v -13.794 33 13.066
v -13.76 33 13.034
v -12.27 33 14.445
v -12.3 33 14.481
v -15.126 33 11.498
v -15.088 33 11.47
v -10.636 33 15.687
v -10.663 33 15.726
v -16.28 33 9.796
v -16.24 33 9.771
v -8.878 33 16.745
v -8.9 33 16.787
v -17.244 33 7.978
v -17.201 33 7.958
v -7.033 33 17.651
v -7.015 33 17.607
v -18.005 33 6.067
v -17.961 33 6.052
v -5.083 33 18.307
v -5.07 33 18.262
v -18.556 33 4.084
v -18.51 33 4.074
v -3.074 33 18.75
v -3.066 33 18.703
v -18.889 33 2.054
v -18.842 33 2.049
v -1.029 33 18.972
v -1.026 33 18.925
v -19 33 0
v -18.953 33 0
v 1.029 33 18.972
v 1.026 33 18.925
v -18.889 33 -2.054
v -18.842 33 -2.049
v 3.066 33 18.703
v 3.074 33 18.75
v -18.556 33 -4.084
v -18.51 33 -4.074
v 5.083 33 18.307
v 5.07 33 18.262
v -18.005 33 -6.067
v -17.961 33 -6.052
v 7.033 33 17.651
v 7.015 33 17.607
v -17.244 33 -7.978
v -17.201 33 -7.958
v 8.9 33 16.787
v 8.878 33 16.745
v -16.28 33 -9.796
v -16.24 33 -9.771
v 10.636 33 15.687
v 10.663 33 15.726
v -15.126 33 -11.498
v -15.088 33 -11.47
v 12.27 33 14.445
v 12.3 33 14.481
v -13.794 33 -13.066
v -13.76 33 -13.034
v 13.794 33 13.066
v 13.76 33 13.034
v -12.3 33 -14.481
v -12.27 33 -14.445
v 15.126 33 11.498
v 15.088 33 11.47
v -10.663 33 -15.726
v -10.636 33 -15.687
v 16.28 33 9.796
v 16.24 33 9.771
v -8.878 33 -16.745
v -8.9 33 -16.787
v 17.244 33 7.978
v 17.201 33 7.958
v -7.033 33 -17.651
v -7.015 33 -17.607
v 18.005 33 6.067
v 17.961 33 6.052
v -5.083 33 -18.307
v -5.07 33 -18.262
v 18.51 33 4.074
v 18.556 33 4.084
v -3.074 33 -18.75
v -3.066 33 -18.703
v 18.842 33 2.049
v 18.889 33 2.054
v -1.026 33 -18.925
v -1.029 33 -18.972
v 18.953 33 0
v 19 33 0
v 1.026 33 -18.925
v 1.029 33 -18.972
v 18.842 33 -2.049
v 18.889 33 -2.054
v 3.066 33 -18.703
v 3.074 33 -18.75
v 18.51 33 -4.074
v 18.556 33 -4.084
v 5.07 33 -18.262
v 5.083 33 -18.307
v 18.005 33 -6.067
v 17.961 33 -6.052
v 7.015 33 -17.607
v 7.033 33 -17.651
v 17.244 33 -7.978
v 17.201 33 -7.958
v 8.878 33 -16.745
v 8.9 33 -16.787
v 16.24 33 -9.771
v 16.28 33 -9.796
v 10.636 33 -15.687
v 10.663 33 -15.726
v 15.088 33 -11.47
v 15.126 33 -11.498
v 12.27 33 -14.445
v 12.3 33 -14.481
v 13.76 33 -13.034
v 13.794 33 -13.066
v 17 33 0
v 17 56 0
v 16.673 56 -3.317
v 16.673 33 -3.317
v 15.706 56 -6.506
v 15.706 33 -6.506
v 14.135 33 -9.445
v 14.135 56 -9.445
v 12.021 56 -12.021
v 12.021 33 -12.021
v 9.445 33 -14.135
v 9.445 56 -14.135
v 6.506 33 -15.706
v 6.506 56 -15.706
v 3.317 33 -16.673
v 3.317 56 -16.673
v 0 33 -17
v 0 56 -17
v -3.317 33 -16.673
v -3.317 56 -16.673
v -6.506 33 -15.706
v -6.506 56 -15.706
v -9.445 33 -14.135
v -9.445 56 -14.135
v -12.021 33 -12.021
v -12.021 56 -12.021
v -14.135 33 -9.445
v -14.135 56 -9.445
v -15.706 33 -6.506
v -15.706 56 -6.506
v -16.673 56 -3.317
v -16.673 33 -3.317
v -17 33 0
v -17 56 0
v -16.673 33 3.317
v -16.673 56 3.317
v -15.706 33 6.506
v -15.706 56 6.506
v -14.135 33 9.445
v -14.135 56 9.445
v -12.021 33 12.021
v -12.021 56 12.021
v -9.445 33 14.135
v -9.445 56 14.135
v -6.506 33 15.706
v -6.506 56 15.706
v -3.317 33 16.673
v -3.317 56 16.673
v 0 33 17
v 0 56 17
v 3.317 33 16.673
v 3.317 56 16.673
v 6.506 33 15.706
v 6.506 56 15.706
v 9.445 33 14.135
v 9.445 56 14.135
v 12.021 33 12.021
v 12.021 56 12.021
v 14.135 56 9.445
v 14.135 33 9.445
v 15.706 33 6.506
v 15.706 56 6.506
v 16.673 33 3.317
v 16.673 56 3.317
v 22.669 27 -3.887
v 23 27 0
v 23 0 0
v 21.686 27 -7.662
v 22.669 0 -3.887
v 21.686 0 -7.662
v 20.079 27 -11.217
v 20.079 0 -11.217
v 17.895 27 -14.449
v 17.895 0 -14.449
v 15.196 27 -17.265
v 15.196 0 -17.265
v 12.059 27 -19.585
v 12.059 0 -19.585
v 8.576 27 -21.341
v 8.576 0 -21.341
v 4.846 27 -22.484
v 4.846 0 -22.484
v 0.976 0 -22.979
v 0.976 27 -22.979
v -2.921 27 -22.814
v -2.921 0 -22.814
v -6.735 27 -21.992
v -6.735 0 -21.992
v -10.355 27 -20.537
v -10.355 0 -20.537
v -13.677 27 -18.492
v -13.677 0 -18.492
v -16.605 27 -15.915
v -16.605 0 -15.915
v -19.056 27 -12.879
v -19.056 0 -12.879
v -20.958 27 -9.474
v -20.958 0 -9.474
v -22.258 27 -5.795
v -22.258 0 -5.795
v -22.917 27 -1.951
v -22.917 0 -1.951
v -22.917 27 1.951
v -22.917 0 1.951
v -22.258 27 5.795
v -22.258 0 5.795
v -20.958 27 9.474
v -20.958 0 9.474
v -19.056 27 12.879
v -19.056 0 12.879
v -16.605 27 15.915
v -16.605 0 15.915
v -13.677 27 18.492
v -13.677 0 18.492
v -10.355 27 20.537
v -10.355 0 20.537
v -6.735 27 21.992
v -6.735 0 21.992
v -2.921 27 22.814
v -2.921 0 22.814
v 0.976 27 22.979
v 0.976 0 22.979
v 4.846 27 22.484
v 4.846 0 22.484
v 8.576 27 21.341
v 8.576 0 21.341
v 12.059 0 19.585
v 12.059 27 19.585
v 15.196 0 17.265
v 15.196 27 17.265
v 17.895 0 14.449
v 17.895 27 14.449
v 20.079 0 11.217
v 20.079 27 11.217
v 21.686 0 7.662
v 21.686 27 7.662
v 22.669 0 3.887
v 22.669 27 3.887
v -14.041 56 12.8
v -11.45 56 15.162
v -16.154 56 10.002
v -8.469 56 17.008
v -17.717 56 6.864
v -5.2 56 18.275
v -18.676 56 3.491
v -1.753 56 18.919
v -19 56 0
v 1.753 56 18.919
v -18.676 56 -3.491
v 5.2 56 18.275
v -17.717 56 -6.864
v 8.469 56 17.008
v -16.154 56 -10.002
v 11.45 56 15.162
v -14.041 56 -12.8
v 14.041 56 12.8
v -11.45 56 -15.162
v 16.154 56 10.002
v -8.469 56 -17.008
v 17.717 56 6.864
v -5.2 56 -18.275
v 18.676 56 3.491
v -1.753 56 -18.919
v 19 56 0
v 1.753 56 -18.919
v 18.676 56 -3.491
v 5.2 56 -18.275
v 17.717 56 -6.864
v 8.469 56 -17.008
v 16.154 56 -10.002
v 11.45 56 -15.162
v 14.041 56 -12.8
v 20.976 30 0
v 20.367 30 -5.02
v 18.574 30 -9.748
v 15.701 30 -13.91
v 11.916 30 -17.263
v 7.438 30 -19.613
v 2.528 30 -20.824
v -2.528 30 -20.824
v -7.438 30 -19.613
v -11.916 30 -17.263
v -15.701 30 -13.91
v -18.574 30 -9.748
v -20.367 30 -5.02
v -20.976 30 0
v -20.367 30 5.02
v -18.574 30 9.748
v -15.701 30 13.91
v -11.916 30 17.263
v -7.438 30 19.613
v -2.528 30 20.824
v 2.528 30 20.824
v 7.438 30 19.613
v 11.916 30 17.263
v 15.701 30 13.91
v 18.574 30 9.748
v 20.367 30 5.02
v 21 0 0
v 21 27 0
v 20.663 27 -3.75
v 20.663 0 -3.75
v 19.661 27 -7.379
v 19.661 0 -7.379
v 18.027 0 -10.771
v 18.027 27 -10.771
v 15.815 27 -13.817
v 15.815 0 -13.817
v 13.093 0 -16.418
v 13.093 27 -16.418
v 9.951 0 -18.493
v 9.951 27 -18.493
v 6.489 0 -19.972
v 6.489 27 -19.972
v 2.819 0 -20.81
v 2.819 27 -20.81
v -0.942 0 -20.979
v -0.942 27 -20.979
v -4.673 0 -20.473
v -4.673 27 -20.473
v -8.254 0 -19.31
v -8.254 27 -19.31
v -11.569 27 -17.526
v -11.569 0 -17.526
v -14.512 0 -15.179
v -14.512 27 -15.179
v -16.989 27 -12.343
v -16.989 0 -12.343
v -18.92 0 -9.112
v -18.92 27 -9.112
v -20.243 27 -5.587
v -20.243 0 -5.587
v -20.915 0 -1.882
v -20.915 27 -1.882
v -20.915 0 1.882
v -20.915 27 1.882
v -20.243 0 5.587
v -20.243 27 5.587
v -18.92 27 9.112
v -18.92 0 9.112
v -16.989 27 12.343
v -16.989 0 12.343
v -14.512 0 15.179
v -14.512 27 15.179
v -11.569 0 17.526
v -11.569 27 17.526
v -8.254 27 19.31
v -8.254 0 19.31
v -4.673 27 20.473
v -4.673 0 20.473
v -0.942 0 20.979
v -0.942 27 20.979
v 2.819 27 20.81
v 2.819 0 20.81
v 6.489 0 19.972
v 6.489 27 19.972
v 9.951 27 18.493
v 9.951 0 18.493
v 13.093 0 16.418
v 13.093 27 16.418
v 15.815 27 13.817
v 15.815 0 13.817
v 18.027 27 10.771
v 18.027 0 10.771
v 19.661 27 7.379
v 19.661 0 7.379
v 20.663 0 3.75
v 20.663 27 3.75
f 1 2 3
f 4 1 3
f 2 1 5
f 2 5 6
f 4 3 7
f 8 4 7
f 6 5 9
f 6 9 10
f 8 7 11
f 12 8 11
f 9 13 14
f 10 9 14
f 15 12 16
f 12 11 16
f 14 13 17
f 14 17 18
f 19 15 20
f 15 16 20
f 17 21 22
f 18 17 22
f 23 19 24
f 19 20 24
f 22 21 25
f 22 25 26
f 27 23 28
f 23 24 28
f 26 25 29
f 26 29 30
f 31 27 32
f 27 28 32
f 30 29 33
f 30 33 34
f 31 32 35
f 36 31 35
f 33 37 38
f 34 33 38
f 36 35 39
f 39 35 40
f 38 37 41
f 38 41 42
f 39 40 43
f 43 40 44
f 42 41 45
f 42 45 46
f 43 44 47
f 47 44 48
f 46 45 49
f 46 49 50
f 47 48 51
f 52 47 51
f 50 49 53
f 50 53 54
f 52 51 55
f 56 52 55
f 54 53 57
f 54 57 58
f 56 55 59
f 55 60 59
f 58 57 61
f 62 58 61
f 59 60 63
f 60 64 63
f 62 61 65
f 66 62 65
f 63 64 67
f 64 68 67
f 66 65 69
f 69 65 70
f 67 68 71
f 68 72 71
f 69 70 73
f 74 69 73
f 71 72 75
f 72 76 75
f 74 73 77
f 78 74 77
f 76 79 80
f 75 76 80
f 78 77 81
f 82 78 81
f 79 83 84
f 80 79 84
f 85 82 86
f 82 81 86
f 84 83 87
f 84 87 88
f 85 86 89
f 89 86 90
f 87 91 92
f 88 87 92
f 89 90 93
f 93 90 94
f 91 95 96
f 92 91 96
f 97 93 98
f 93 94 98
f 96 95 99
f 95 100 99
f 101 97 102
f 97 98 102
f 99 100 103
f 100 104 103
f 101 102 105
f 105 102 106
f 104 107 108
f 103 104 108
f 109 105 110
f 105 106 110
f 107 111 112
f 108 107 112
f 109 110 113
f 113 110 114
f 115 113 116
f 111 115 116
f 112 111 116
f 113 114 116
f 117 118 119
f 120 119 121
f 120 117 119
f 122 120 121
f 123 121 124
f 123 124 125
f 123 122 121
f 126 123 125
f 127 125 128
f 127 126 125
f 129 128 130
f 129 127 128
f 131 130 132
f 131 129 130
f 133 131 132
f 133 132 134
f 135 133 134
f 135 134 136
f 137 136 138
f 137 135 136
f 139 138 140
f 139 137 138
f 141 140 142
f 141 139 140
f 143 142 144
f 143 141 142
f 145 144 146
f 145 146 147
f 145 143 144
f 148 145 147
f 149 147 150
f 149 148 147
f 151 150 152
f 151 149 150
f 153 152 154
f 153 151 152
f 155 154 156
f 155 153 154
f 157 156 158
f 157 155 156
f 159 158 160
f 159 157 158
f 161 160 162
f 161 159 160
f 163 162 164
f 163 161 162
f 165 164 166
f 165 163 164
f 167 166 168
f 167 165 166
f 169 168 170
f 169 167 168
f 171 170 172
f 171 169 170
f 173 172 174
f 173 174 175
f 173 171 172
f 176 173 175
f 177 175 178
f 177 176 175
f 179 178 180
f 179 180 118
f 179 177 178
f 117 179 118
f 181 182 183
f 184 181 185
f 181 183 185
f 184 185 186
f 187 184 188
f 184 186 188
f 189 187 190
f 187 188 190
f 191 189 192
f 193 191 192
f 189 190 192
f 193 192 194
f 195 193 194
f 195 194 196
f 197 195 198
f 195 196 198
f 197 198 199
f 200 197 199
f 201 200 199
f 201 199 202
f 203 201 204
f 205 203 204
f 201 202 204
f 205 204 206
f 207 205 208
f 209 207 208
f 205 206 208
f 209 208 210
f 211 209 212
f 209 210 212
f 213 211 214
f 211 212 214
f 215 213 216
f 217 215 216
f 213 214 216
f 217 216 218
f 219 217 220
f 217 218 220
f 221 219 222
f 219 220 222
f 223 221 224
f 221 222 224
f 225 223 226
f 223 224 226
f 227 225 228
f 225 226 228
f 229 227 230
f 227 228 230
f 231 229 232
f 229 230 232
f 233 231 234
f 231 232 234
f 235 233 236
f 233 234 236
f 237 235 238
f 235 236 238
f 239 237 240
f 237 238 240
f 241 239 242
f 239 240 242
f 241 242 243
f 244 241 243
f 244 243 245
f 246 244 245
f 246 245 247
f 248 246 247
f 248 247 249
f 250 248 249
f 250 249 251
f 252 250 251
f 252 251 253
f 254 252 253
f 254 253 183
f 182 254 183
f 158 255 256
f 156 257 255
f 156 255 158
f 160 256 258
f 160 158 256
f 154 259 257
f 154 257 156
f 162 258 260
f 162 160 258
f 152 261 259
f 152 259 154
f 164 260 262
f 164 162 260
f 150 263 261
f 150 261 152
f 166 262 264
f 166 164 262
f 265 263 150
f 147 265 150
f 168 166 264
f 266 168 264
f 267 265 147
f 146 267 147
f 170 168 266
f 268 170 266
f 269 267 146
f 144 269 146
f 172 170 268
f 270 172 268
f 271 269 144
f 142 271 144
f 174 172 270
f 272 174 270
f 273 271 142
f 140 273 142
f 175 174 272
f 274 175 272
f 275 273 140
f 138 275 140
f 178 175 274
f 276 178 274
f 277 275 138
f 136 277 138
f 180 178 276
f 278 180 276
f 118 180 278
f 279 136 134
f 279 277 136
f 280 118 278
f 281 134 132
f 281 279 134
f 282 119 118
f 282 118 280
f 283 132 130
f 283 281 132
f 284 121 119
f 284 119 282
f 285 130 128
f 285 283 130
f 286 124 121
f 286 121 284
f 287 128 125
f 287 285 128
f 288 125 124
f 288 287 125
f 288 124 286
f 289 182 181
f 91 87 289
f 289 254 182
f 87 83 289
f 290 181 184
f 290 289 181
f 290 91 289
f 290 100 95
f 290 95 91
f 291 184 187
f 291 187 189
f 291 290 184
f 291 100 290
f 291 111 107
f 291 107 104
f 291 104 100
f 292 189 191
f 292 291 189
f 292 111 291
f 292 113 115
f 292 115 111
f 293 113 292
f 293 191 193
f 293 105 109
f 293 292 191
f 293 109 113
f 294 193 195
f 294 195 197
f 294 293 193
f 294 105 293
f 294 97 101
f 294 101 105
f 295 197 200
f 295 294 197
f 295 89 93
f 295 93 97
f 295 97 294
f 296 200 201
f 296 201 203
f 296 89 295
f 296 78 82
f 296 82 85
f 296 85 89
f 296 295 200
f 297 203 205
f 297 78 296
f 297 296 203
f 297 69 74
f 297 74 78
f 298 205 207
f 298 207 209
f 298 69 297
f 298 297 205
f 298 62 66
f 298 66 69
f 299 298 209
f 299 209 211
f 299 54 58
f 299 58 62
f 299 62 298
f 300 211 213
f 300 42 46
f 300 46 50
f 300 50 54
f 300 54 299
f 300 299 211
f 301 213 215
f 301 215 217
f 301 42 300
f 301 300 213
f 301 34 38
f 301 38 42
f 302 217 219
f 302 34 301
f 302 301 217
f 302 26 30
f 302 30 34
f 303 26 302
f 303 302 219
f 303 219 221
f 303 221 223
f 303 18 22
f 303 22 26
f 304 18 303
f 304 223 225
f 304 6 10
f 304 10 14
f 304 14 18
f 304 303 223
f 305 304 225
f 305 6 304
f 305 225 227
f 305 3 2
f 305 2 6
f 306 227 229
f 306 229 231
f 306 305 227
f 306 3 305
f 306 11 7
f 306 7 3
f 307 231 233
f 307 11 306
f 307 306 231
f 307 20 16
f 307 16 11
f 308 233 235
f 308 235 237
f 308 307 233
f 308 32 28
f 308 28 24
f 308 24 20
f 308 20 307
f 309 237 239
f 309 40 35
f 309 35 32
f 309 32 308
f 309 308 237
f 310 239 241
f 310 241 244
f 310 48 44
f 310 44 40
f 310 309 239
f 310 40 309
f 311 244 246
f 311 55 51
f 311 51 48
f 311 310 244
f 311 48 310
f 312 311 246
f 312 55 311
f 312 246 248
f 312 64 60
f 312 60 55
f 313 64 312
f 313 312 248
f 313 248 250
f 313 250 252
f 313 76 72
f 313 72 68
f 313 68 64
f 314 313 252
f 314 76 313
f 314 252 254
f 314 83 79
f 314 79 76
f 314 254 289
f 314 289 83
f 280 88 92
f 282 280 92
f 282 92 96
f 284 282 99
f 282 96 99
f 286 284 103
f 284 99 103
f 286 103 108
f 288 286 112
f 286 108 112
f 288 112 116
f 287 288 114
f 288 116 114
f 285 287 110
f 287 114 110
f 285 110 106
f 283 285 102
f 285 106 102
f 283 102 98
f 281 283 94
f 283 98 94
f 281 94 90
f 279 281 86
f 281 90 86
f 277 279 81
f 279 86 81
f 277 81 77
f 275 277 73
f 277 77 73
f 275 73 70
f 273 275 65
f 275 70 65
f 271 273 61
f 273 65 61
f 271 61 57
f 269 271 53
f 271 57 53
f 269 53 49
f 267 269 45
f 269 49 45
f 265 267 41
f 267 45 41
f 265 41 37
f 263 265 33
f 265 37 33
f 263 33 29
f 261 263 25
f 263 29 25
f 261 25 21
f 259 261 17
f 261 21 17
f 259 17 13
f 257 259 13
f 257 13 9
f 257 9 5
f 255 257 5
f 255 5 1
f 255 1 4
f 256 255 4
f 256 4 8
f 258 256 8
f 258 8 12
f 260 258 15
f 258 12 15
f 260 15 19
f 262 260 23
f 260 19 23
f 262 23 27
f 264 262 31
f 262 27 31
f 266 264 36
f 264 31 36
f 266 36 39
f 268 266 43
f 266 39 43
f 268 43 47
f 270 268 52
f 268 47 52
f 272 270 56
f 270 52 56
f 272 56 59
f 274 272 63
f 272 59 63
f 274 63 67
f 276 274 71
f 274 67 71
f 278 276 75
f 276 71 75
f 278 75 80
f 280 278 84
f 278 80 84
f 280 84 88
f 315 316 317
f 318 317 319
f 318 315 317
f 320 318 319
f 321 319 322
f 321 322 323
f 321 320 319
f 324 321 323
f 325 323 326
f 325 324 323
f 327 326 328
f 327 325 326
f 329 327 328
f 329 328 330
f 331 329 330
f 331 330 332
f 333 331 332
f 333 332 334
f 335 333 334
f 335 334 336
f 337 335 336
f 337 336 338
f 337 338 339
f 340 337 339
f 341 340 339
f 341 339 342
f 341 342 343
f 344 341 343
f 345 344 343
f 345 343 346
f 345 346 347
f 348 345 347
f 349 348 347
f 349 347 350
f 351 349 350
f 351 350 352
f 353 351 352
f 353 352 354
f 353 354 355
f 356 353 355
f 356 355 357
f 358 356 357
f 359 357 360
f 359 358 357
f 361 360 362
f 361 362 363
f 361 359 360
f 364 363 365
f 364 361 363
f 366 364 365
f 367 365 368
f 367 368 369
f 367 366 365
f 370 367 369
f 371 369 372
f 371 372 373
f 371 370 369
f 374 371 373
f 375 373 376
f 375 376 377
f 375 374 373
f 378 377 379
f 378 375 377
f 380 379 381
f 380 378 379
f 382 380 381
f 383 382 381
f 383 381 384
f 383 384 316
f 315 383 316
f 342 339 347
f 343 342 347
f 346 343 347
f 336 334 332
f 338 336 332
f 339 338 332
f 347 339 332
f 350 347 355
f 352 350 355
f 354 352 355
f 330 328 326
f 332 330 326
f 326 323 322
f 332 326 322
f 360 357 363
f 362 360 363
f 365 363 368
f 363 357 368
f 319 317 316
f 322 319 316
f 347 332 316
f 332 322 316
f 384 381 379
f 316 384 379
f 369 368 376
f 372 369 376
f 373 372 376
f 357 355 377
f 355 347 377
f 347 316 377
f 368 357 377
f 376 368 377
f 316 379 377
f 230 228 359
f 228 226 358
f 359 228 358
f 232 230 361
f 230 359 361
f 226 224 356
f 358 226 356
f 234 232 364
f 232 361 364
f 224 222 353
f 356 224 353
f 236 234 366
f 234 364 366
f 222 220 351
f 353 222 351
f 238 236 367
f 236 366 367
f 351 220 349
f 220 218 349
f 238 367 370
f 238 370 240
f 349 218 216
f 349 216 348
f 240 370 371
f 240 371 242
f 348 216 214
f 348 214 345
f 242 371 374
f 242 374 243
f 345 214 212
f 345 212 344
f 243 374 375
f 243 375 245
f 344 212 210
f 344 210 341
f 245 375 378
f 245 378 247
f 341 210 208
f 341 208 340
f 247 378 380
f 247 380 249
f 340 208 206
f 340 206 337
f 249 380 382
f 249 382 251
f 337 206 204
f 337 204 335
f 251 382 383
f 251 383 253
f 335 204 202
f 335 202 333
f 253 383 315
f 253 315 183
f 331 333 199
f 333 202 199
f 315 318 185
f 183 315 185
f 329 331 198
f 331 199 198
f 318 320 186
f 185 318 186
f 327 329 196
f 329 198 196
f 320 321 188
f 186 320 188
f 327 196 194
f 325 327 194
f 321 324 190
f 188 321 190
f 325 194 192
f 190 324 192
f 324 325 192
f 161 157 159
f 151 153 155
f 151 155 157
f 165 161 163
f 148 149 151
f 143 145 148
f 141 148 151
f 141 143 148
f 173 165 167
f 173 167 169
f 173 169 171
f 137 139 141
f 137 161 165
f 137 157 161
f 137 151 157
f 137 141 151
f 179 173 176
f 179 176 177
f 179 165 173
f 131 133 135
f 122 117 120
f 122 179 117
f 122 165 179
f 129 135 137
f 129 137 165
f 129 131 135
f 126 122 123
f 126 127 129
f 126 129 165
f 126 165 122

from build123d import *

# Parameters (mm, degrees)
SKETCH1_R           = 23
SKETCH1_R_2         = 21
EXTRUDE_THIN1_DEPTH = 27
SKETCH2_R           = 19
SKETCH2_R_2         = 17
EXTRUDE_THIN2_DEPTH = 23
SKETCH3_R           = 21
BOSS_EXTRUDE1_DEPTH = 6
BOSS_EXTRUDE1_TAPER = 34
SKETCH4_R           = 23
BOSS_EXTRUDE2_DEPTH = 6
BOSS_EXTRUDE2_TAPER = 34


with BuildPart() as part:
    # Sketch1 → Extrude-Thin1 (new body)
    with BuildSketch(Plane(origin=(0, 0, 0), x_dir=(1, 0, 0), z_dir=(0, 1, 0))):
        Circle(SKETCH1_R)
        Circle(SKETCH1_R_2, mode=Mode.SUBTRACT)
    extrude(amount=EXTRUDE_THIN1_DEPTH)



with BuildPart() as body_2:
    # Sketch2 → Extrude-Thin2 (new body)
    with BuildSketch(Plane(origin=(0, 0, 0), x_dir=(1, 0, 0), z_dir=(0, 1, 0))):
        Circle(SKETCH2_R)
        Circle(SKETCH2_R_2, mode=Mode.SUBTRACT)
    extrude(amount=EXTRUDE_THIN2_DEPTH)


with BuildPart() as body_2_1:
    # Move Face1: read off the stored shape, not the designer's step
    # Move Face1: moved
    add(body_2.part.moved(Location((0, 33, 0))))


with BuildPart() as body_3:
    # Sketch3 → Boss-Extrude1 (new body)
    with BuildSketch(Plane(origin=(0, 27, 0), x_dir=(1, 0, 0), z_dir=(0, 1, 0))):
        with Locations(Location((0, 0, 0), (0, 0, 270))):
            Circle(SKETCH3_R)
    extrude(amount=BOSS_EXTRUDE1_DEPTH, taper=BOSS_EXTRUDE1_TAPER)


with BuildPart() as part_1:
    add(part.part)

    add(body_2_1.part)  # Boss-Extrude2 merges body 2

    add(body_3.part)  # Boss-Extrude2 merges body 3
    # Sketch4 → Boss-Extrude2 (add)
    with BuildSketch(Plane(origin=(0, 27, 0), x_dir=(1, 0, 0), z_dir=(0, 1, 0))):
        Circle(SKETCH4_R)
    extrude(amount=BOSS_EXTRUDE2_DEPTH, taper=BOSS_EXTRUDE2_TAPER)


solid = part_1.part
